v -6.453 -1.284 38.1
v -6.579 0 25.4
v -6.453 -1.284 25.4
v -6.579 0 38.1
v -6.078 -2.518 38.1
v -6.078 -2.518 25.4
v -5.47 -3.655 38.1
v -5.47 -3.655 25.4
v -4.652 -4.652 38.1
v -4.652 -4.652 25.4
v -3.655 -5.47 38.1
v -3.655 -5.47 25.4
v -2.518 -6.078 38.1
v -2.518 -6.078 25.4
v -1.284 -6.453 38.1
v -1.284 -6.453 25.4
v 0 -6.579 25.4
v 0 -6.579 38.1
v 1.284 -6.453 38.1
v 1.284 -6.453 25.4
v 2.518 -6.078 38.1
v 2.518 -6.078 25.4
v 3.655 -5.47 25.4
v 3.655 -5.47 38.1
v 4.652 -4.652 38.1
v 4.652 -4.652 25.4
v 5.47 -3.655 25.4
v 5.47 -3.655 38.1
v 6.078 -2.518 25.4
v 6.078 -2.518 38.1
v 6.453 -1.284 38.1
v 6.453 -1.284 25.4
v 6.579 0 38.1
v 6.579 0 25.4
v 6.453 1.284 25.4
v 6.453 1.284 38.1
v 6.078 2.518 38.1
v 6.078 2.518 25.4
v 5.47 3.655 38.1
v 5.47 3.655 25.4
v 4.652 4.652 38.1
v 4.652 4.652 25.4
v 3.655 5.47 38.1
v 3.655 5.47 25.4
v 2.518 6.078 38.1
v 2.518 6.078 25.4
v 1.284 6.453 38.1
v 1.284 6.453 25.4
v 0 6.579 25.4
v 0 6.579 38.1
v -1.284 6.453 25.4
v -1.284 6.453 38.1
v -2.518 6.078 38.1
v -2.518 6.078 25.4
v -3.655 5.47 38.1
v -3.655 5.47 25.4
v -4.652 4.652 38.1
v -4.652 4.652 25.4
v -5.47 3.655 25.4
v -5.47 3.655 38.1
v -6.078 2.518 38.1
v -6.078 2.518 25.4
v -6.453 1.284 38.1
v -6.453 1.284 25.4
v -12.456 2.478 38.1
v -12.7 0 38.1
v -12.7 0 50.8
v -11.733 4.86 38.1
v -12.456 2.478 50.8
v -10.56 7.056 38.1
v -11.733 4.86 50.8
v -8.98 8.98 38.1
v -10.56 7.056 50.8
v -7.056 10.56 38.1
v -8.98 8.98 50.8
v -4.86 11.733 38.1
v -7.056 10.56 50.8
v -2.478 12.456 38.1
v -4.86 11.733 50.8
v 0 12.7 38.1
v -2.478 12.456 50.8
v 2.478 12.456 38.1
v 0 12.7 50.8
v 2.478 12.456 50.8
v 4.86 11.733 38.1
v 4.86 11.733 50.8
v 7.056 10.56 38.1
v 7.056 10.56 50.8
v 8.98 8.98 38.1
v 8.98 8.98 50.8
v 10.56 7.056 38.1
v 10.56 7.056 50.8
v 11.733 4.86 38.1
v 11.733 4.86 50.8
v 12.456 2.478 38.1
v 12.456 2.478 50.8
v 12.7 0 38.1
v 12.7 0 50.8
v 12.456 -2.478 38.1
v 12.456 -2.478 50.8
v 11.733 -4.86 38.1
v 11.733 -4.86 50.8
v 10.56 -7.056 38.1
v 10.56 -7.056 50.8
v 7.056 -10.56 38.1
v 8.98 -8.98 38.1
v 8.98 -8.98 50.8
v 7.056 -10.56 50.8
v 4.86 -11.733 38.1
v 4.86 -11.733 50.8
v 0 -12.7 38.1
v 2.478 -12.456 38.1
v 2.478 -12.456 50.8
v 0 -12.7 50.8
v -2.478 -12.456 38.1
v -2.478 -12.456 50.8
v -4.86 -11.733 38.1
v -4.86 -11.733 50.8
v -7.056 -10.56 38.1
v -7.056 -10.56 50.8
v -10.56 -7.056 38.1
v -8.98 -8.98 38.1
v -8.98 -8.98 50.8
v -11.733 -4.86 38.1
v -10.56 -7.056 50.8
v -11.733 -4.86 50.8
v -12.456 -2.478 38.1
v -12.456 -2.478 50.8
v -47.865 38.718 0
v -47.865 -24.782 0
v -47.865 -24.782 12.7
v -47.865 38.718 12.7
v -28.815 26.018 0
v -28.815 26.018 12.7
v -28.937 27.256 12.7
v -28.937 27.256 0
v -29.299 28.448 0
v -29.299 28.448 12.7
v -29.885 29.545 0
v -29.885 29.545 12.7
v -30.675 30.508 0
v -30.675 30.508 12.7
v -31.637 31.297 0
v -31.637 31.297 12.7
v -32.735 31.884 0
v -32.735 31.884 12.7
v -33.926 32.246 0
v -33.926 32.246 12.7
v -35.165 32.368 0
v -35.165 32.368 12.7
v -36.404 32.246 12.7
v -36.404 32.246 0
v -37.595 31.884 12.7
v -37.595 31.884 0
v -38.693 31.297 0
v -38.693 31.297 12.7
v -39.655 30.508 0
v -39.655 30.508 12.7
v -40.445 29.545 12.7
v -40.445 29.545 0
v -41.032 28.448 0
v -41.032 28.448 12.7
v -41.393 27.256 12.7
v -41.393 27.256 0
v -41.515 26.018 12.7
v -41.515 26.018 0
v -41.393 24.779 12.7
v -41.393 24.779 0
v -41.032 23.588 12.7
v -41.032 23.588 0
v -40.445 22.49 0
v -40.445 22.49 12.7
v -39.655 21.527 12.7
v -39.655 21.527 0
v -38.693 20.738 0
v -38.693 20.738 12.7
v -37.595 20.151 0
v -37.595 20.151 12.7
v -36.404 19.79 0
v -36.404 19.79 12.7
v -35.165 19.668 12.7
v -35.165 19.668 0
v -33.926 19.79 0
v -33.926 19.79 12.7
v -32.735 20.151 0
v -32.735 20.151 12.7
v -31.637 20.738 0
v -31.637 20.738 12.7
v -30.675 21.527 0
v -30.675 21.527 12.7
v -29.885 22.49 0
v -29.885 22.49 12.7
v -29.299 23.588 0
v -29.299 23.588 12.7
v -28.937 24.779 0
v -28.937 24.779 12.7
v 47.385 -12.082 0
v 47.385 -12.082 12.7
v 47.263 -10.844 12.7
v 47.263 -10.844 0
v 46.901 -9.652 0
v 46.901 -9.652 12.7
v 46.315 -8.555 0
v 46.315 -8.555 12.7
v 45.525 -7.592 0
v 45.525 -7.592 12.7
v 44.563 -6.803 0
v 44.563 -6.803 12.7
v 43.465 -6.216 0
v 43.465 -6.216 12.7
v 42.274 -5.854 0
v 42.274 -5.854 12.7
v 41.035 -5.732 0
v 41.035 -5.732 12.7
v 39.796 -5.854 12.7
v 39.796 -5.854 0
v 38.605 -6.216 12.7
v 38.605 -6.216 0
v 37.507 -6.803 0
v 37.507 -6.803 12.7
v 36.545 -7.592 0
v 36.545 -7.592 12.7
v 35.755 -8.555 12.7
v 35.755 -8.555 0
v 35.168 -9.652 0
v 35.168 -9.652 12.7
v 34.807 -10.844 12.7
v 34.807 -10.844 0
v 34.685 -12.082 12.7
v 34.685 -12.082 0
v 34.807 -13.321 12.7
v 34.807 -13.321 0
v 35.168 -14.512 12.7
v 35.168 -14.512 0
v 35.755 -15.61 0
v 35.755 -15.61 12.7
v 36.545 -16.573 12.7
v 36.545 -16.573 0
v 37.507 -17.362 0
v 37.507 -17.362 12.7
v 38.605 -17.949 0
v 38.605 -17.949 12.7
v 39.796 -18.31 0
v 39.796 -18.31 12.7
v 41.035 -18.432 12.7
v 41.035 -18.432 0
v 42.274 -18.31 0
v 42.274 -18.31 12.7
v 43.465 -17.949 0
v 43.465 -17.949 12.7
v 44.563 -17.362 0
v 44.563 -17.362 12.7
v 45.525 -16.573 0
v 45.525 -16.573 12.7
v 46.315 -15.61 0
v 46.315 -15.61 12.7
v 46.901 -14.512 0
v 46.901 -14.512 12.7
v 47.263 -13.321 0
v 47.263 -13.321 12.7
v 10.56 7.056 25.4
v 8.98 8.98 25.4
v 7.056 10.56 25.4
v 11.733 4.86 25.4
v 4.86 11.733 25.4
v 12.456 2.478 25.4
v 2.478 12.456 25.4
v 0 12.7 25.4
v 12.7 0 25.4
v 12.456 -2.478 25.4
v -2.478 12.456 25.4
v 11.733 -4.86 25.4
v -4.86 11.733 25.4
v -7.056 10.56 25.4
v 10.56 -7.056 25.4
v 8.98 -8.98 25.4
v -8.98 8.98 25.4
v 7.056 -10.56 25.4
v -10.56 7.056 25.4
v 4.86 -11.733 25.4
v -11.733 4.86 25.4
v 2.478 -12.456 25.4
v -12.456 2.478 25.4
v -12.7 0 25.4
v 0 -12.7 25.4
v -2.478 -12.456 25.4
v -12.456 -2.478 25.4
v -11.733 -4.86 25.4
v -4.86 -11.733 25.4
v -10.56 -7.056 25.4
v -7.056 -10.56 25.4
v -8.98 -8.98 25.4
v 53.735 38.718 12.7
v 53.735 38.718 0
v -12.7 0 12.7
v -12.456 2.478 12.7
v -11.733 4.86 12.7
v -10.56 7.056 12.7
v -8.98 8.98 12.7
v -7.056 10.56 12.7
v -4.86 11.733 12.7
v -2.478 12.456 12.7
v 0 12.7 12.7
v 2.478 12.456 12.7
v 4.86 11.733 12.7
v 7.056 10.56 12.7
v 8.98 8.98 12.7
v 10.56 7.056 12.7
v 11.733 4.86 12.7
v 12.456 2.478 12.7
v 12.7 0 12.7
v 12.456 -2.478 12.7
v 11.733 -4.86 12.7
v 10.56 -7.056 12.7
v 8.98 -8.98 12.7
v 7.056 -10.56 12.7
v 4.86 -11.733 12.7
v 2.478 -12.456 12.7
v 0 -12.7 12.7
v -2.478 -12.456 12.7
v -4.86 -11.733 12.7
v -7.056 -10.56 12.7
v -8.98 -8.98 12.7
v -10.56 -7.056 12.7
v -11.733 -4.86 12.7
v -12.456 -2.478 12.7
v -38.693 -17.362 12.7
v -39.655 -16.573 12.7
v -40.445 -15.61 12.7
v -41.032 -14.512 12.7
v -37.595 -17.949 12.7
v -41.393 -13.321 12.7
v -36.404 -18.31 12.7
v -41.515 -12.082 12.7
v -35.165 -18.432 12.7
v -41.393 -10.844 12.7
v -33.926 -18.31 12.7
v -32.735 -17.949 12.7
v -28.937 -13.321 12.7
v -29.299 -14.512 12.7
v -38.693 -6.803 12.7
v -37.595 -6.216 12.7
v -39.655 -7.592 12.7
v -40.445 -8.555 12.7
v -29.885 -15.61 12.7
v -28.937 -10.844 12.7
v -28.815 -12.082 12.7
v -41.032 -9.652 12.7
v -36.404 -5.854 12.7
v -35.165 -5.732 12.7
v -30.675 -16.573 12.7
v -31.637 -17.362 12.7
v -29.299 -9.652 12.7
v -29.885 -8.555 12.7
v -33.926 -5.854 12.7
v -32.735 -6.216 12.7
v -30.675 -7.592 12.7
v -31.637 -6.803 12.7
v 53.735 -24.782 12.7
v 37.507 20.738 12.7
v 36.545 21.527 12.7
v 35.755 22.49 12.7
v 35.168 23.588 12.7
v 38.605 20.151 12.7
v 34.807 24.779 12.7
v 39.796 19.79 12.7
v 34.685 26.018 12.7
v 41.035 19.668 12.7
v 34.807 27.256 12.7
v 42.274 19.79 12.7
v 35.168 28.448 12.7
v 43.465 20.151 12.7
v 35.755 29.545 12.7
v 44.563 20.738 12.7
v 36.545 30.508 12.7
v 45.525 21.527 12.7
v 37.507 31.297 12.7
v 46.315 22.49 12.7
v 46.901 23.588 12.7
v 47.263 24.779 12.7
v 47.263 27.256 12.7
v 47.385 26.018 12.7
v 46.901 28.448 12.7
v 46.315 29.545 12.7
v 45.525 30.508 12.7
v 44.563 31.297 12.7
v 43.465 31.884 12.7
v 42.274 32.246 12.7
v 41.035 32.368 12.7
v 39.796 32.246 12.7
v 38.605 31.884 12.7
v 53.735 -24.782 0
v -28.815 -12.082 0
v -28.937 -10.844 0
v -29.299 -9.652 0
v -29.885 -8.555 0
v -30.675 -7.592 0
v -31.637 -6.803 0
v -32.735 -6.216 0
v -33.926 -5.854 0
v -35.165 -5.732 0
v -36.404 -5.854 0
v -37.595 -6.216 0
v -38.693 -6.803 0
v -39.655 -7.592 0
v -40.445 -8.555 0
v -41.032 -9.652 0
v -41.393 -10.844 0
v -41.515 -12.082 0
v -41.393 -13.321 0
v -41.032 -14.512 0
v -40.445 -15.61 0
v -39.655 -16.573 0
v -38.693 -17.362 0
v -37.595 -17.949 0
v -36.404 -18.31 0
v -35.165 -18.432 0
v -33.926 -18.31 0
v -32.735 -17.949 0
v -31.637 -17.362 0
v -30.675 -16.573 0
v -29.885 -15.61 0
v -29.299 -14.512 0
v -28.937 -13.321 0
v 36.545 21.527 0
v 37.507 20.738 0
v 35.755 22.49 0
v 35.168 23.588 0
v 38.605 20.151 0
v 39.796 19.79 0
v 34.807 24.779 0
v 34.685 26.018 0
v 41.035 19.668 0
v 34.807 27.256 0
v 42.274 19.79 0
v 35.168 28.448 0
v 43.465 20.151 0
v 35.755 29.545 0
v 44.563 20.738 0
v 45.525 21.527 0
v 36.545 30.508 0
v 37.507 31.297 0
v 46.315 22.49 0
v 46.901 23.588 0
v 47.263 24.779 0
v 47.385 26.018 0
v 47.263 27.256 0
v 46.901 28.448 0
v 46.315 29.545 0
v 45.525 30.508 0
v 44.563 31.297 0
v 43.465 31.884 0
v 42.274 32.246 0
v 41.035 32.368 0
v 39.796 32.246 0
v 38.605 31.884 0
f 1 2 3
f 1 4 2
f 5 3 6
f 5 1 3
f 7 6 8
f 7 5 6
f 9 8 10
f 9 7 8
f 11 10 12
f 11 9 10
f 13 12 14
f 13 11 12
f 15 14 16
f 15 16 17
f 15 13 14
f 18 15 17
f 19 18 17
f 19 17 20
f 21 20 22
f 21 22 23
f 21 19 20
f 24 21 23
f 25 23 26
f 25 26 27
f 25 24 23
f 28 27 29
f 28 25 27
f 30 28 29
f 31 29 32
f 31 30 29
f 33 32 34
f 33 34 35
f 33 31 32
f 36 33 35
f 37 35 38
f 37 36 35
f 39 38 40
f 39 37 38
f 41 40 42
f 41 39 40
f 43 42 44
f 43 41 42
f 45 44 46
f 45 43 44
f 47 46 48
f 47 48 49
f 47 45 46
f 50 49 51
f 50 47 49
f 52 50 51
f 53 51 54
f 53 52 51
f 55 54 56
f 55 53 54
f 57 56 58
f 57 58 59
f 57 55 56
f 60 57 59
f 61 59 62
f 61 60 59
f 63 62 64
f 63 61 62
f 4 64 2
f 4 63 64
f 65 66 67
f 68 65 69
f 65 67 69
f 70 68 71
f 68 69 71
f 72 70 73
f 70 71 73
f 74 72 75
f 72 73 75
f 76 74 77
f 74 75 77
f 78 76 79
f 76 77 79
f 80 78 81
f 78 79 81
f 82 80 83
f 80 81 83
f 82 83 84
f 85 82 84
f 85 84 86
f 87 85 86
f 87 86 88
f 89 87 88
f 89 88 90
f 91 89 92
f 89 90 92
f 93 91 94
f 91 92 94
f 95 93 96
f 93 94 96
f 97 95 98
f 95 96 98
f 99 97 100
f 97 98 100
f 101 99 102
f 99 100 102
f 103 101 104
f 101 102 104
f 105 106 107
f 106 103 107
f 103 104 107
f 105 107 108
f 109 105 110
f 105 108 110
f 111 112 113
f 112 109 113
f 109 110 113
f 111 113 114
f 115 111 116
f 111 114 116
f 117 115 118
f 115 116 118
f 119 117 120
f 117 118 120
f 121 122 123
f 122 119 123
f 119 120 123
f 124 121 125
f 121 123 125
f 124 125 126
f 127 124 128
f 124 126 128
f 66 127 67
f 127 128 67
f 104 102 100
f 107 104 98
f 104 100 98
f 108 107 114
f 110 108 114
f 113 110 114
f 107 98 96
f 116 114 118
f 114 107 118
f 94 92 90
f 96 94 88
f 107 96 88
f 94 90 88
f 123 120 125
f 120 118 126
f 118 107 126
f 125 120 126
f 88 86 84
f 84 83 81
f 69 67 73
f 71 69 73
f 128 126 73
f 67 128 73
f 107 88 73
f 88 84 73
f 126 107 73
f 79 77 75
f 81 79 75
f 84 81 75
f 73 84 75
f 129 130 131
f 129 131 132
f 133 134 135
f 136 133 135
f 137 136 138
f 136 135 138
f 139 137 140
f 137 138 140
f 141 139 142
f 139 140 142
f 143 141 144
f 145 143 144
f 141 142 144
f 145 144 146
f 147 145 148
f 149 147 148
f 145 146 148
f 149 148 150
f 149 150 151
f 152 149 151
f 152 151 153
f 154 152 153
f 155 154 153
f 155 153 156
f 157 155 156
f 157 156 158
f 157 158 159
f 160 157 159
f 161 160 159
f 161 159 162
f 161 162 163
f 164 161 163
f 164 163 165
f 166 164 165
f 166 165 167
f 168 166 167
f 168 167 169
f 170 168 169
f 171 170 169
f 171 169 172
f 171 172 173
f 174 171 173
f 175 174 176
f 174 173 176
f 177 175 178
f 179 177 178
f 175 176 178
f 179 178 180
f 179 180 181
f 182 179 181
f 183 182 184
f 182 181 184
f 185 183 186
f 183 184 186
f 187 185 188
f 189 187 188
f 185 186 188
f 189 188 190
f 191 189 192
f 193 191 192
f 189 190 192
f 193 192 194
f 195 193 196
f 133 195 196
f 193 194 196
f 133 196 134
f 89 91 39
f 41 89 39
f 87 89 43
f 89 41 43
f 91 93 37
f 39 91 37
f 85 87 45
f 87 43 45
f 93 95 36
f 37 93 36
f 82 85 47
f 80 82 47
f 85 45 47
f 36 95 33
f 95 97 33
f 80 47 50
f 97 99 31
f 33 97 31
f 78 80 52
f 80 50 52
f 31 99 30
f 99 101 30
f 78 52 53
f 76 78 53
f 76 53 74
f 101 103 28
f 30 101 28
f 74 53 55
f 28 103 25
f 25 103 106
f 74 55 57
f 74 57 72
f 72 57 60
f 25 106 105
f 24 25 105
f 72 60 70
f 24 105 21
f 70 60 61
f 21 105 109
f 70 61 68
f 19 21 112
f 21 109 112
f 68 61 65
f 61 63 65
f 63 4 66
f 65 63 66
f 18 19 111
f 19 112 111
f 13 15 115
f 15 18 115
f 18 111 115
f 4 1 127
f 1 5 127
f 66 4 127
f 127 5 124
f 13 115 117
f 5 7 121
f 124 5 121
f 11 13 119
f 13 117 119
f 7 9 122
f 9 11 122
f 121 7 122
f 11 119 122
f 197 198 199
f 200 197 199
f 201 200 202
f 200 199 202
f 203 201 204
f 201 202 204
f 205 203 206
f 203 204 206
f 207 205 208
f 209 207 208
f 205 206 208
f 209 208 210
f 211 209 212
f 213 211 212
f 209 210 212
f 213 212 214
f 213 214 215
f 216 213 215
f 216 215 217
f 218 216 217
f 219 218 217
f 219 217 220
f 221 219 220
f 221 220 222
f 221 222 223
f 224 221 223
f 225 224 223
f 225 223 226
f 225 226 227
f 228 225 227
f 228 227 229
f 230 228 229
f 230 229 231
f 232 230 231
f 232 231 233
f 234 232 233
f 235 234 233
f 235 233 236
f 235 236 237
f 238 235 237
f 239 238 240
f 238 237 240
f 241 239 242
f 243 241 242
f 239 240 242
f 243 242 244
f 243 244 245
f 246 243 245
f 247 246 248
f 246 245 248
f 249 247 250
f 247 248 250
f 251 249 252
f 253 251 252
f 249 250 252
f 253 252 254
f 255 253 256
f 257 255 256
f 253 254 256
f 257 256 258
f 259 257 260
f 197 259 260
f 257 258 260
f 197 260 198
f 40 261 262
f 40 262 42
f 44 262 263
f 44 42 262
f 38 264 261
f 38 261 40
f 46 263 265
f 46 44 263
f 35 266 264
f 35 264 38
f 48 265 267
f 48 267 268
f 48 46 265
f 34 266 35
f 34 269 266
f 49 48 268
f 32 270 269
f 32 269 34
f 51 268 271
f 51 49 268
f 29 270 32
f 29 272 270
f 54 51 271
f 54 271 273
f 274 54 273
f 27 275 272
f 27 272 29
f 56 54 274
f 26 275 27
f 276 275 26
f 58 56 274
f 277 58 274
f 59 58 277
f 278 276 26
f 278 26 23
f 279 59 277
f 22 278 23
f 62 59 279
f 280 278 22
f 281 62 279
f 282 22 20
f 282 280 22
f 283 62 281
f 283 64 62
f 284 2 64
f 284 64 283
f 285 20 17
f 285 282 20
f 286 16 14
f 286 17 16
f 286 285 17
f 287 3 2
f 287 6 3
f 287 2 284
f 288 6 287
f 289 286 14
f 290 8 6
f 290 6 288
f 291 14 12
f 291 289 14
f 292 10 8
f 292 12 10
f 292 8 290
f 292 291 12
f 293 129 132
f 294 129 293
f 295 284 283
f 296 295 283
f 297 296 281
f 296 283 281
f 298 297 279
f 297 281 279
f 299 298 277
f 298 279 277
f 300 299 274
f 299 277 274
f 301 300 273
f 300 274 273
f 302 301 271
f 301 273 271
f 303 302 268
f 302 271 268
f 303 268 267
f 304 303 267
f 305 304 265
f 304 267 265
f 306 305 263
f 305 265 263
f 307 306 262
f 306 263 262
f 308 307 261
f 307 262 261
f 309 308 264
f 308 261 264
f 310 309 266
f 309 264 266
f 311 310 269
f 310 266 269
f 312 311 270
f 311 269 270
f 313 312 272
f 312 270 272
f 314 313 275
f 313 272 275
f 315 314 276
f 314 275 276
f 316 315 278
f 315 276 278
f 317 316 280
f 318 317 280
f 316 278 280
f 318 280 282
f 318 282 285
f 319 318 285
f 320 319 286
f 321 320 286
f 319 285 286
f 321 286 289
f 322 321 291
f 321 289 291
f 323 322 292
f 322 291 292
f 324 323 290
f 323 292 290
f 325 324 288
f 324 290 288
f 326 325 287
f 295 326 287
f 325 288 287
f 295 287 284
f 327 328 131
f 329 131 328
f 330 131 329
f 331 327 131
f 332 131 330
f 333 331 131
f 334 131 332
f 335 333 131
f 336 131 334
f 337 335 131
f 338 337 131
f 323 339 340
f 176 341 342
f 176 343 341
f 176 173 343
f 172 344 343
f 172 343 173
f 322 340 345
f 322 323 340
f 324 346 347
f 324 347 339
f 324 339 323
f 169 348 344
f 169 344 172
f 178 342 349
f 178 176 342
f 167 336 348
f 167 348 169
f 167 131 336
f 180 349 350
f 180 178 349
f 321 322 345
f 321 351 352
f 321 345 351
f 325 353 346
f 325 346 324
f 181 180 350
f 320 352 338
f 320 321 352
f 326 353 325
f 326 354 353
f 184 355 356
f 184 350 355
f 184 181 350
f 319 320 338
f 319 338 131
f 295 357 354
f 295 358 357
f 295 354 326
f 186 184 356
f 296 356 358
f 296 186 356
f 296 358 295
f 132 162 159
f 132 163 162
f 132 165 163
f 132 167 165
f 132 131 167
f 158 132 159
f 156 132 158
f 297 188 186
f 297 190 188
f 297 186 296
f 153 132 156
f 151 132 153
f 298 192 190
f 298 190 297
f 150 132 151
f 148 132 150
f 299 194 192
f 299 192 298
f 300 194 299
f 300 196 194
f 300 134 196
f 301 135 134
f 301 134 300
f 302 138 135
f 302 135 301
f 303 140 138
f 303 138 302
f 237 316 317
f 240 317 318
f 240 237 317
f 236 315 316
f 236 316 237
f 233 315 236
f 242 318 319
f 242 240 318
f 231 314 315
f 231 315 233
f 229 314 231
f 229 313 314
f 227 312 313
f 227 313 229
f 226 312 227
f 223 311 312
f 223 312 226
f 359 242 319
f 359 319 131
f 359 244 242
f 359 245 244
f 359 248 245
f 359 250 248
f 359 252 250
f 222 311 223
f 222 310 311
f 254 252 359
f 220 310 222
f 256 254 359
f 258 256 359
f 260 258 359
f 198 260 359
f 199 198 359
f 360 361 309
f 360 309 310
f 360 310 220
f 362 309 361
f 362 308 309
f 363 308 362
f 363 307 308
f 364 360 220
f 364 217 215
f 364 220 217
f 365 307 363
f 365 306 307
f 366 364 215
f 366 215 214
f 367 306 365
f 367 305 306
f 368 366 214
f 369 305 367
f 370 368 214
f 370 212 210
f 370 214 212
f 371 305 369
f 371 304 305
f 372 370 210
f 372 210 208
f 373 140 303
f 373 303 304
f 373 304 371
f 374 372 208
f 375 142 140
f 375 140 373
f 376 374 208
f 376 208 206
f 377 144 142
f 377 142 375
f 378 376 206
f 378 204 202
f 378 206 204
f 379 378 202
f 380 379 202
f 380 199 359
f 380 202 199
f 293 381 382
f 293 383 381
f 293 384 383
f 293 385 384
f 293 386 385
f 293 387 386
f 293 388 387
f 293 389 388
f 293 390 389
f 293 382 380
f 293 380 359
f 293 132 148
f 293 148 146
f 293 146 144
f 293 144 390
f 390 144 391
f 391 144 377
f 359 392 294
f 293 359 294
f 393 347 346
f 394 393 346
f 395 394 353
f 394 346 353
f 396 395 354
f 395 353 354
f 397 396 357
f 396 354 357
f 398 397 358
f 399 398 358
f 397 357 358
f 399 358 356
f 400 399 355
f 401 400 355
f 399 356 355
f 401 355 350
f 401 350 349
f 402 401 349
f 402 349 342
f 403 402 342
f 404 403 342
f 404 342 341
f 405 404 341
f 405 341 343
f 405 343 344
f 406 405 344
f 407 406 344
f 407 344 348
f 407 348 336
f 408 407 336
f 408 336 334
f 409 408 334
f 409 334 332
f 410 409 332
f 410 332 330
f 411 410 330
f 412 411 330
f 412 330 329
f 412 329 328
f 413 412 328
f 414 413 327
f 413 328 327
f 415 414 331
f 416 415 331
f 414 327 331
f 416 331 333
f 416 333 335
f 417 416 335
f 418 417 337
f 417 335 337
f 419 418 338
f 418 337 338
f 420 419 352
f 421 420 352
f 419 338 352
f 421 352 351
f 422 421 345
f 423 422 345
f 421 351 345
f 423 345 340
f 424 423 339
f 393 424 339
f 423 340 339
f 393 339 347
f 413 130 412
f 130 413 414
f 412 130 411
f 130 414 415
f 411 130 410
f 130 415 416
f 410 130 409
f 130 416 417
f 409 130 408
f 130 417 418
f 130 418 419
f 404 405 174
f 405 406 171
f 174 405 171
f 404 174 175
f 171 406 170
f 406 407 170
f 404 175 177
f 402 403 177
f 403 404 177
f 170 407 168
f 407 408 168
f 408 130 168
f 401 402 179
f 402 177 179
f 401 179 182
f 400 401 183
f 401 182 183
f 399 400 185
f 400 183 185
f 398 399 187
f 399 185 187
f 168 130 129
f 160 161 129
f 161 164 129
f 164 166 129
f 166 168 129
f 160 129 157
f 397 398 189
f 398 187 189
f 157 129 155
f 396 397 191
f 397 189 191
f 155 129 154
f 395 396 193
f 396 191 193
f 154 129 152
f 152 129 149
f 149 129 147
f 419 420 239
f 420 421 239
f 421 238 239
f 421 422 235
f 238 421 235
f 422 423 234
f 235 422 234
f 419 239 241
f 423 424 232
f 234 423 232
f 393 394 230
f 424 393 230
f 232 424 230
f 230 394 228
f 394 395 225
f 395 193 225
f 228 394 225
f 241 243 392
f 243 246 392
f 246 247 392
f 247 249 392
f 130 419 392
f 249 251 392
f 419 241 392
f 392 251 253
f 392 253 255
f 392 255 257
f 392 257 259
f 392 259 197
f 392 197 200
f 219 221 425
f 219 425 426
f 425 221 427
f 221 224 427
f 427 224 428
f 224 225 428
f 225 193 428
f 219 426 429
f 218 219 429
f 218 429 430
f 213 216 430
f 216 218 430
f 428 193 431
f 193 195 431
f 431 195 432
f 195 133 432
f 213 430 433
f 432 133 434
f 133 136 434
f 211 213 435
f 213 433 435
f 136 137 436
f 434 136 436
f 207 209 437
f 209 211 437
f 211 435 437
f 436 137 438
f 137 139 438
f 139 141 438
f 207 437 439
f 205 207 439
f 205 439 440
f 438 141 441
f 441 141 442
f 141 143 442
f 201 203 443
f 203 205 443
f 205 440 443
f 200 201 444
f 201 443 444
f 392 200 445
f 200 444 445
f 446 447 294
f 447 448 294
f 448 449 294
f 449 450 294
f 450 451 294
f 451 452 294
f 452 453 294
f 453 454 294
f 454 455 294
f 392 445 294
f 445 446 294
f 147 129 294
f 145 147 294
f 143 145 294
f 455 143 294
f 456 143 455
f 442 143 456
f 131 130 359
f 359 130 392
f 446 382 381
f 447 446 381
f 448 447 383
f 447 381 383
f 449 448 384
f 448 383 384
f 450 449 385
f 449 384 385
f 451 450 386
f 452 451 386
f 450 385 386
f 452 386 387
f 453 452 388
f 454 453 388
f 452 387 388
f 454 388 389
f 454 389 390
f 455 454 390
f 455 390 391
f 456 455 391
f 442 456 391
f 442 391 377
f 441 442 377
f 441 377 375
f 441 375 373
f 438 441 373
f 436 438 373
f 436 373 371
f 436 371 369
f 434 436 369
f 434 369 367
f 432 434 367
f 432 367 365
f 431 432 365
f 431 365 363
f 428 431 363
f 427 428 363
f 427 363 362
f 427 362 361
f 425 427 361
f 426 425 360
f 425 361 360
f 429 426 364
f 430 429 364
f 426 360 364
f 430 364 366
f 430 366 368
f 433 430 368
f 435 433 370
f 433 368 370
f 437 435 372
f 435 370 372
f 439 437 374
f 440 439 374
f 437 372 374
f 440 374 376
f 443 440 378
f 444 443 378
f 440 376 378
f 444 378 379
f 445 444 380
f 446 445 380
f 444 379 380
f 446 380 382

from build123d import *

# Parameters (mm, degrees)
F0_W     = 101.6
F0_H     = 63.5
F1_DEPTH = 12.7
F2_R     = 6.35
F3_DEPTH = 12.701
F4_W     = 12.7
F4_H     = 38.1
F6_W     = 25.375047
F6_H     = 12.7


with BuildPart() as f1:
    # F0 (on Top) → F1 (new body)
    with BuildSketch(Plane.XY):
        with Locations((2.934791, 6.967624)):
            Rectangle(F0_W, F0_H)
    extrude(amount=F1_DEPTH)

    # F2 (on face) → F3 (cut, through all)
    with BuildSketch(Plane.XY.offset(12.7)):
        with Locations((-35.165209, 26.017624)):
            Circle(F2_R)
        with Locations((-35.165209, -12.082376)):
            Circle(F2_R)
        with Locations((41.034791, -12.082376)):
            Circle(F2_R)
        with Locations((41.034791, 26.017624)):
            Circle(F2_R)
    extrude(amount=-F3_DEPTH, mode=Mode.SUBTRACT)

    # F4 (on Front) → F5 (revolve)
    with BuildSketch(Plane.XZ):
        with Locations((-6.35, 31.75)):
            Rectangle(F4_W, F4_H)
    revolve(axis=Axis((0, 0, 31.75), (0, 0, -1)))

    # F6 (on Front) → F7 (revolve, cut)
    with BuildSketch(Plane.XZ):
        with Locations((-19.26654, 31.75)):
            Rectangle(F6_W, F6_H)
    revolve(axis=Axis((0, 0, 26.451318), (0, 0, 1)), mode=Mode.SUBTRACT)


solid = f1.part
